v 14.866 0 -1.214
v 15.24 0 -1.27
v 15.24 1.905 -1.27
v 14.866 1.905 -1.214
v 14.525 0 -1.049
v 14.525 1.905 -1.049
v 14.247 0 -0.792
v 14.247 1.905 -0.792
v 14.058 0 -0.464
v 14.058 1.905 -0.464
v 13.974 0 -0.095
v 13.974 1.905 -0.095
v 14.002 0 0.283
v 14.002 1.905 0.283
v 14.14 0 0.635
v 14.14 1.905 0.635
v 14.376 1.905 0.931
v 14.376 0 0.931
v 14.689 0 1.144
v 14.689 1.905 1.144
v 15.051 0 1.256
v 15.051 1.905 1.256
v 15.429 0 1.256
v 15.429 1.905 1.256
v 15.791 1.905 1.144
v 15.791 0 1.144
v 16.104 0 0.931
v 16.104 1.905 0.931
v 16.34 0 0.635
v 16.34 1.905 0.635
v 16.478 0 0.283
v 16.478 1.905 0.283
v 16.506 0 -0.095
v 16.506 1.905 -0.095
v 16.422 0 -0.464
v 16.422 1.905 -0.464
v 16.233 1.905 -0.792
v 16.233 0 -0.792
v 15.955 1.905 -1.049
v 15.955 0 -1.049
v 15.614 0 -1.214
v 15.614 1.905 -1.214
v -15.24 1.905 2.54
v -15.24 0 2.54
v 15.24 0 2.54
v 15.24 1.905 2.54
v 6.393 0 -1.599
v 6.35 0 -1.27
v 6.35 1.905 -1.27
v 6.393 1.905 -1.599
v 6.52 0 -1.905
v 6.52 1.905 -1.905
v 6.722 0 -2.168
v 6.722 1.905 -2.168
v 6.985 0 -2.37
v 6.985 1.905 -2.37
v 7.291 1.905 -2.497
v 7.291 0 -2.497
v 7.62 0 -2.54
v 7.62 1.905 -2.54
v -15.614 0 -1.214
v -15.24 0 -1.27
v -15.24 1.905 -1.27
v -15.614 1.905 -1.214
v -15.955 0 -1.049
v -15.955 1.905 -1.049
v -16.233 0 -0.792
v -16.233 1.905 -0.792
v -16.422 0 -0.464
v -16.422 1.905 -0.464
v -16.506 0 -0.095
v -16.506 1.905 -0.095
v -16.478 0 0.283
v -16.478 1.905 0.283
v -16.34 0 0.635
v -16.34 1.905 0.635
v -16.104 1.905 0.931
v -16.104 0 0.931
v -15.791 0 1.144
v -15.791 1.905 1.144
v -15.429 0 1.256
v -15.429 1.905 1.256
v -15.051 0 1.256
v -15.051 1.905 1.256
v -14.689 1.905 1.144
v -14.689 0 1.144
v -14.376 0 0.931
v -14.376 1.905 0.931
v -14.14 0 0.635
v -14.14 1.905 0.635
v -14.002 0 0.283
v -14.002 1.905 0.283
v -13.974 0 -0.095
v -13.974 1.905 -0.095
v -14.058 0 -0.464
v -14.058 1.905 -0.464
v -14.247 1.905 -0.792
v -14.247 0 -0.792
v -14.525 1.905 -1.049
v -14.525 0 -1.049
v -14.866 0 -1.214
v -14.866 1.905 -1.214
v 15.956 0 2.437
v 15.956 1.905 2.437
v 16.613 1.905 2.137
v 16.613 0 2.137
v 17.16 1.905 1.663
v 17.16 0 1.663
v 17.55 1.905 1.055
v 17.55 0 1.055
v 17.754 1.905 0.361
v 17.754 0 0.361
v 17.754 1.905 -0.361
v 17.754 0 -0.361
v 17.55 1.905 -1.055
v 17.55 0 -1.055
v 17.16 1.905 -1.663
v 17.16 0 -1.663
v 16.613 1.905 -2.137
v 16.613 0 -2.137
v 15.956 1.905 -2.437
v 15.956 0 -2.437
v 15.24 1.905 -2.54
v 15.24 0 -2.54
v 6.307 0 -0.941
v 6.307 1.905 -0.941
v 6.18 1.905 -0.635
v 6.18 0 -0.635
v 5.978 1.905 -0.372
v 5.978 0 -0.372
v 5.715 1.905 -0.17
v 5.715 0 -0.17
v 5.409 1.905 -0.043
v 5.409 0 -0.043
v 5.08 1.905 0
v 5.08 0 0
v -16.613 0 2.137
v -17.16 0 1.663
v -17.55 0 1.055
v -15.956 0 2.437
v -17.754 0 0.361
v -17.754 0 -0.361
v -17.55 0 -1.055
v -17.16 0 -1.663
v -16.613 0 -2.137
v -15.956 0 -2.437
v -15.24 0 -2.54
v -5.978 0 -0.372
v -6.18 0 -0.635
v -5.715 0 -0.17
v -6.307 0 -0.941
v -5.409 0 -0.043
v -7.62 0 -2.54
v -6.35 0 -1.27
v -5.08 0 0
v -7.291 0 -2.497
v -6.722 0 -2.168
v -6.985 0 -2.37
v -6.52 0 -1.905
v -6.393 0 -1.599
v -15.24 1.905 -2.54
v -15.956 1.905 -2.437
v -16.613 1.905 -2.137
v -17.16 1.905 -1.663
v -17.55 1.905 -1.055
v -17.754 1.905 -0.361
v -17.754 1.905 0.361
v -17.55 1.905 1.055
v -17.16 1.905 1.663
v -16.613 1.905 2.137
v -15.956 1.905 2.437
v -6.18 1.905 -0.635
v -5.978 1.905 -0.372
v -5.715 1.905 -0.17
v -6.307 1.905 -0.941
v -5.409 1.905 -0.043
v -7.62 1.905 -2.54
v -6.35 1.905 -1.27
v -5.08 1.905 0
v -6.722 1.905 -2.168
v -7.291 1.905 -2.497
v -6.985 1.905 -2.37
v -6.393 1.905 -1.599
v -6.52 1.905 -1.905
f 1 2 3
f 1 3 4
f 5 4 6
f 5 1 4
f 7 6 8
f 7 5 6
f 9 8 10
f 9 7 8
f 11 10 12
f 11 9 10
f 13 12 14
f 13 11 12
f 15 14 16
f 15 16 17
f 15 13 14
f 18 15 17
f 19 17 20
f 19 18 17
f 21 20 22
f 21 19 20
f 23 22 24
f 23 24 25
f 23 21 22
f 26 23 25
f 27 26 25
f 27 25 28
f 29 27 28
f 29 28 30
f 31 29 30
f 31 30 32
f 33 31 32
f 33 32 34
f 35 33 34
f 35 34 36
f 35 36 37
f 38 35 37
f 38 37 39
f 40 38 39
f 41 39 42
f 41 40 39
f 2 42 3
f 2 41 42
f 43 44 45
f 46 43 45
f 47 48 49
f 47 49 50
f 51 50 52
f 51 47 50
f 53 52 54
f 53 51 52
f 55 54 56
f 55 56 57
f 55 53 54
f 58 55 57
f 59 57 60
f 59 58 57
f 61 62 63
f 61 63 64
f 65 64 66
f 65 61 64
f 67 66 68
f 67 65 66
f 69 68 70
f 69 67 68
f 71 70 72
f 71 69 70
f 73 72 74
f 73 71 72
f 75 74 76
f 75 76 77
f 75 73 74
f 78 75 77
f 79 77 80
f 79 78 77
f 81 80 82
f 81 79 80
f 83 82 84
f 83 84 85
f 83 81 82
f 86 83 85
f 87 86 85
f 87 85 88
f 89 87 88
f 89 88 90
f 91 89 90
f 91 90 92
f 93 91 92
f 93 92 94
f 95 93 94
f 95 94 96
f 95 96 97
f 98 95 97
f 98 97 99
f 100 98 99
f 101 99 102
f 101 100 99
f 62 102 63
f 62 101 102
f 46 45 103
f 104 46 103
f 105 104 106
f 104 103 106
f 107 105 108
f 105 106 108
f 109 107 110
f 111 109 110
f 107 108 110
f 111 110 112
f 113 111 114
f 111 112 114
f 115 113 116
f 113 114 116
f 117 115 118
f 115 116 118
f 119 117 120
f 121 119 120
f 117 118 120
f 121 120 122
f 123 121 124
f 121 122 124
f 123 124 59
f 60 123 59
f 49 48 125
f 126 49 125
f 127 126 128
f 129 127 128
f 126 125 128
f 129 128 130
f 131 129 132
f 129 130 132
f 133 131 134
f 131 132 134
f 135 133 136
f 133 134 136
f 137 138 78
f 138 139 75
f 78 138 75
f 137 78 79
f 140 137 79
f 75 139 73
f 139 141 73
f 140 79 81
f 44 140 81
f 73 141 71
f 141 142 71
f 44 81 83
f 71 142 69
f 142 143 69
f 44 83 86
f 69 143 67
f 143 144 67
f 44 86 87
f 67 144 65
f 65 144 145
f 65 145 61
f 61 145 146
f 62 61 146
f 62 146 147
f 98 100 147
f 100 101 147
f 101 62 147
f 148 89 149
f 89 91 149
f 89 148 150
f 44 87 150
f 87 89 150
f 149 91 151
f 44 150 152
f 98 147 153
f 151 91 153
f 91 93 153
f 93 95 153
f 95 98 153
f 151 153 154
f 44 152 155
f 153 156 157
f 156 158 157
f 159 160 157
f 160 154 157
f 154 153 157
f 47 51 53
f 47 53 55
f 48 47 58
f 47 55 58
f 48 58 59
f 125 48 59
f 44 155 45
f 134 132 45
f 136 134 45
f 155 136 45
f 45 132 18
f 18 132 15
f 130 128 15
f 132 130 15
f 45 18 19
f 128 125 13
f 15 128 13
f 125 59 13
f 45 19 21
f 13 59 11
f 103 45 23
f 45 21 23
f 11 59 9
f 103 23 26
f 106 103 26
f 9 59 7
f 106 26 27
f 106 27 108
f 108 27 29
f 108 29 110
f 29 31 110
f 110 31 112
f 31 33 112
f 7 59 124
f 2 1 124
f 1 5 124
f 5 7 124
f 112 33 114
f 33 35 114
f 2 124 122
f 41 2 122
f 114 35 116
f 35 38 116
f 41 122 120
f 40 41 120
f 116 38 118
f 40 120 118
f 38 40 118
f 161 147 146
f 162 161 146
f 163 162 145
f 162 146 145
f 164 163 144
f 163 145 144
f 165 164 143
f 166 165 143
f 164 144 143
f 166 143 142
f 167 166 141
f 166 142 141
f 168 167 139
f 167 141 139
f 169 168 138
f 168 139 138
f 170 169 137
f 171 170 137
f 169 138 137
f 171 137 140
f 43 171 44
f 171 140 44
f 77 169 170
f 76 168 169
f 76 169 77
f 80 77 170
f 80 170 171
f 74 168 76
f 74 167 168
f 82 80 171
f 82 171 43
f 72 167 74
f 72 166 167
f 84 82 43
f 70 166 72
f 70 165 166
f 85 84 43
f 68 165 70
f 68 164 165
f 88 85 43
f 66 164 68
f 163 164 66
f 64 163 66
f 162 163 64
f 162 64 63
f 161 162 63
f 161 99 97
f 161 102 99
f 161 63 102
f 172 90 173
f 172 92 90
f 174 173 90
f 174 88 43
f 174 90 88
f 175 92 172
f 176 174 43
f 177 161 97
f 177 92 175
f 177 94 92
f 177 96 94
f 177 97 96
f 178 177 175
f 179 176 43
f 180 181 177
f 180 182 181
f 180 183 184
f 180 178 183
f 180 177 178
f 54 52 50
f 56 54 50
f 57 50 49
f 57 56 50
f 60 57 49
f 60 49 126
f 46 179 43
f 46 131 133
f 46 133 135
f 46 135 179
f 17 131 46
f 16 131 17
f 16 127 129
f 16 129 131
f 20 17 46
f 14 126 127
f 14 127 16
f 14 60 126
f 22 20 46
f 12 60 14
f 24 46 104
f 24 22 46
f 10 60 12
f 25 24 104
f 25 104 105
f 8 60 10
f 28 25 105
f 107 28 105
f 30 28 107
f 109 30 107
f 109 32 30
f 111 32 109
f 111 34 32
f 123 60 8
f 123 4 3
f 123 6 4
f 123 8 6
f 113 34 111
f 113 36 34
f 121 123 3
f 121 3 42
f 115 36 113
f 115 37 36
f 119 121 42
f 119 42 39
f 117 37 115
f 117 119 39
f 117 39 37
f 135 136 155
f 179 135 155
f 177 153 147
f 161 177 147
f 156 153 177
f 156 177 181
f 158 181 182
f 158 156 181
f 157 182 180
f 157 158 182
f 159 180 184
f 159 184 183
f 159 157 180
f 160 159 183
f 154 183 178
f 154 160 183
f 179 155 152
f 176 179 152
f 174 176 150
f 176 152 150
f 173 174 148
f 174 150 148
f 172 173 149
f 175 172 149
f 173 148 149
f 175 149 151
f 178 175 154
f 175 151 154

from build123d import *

# Parameters (mm, degrees)
SKETCH1_R           = 1.27
BOSS_EXTRUDE1_DEPTH = 1.905
FILLET1_START       = -1
FILLET1_DEPTH       = 4
FILLET1_2_DEPTH     = 1.905


with BuildPart() as part:
    # Sketch1 → Boss-Extrude1 (new body)
    with BuildSketch(Plane(origin=(0, 0, 0), x_dir=(1, 0, 0), z_dir=(0, 1, 0))):
        with BuildLine():
            Line((6.35, 2.54), (6.35, 0))
            Line((6.35, 0), (-6.35, 0))
            Line((-6.35, 0), (-6.35, 2.54))
            Line((-6.35, 2.54), (-15.24, 2.54))
            ThreePointArc((-15.24, 2.54), (-17.78, 0), (-15.24, -2.54))
            Line((-15.24, -2.54), (15.24, -2.54))
            ThreePointArc((15.24, -2.54), (17.78, 0), (15.24, 2.54))
            Line((15.24, 2.54), (6.35, 2.54))
        make_face()
        with Locations(Location((-15.24, 0, 0), (0, 0, 90))):
            Circle(SKETCH1_R, mode=Mode.SUBTRACT)
        with Locations(Location((15.24, 0, 0), (0, 0, 90))):
            Circle(SKETCH1_R, mode=Mode.SUBTRACT)
    extrude(amount=BOSS_EXTRUDE1_DEPTH)

    # Fillet1: read off the stored shape, not the designer's step
    # Fillet1 outline → Fillet1 (cut)
    with BuildSketch(Plane(origin=(0, 0, 0), x_dir=(1, 0, 0), z_dir=(0, 1, 0)).offset(FILLET1_START)):
        with BuildLine():
            Line((6.35, 2.54), (6.35, 1.27))
            ThreePointArc((6.35, 1.27), (6.721974388, 2.168025612), (7.62, 2.54))
            Line((7.62, 2.54), (6.35, 2.54))
        make_face()
        with BuildLine():
            ThreePointArc((-7.62, 2.54), (-6.721974388, 2.168025612), (-6.35, 1.27))
            Line((-6.35, 1.27), (-6.35, 2.54))
            Line((-6.35, 2.54), (-7.62, 2.54))
        make_face()
    extrude(amount=FILLET1_DEPTH, mode=Mode.SUBTRACT)

    # Fillet1 2 outline → Fillet1 2 (add)
    with BuildSketch(Plane(origin=(0, 0, 0), x_dir=(1, 0, 0), z_dir=(0, 1, 0))):
        with BuildLine():
            Line((-6.35, 0), (-5.08, 0))
            ThreePointArc((-5.08, 0), (-5.978025612, 0.371974388), (-6.35, 1.27))
            Line((-6.35, 1.27), (-6.35, 0))
        make_face()
        with BuildLine():
            ThreePointArc((6.35, 1.27), (5.978025612, 0.371974388), (5.08, 0))
            Line((5.08, 0), (6.35, 0))
            Line((6.35, 0), (6.35, 1.27))
        make_face()
    extrude(amount=FILLET1_2_DEPTH)


solid = part.part
